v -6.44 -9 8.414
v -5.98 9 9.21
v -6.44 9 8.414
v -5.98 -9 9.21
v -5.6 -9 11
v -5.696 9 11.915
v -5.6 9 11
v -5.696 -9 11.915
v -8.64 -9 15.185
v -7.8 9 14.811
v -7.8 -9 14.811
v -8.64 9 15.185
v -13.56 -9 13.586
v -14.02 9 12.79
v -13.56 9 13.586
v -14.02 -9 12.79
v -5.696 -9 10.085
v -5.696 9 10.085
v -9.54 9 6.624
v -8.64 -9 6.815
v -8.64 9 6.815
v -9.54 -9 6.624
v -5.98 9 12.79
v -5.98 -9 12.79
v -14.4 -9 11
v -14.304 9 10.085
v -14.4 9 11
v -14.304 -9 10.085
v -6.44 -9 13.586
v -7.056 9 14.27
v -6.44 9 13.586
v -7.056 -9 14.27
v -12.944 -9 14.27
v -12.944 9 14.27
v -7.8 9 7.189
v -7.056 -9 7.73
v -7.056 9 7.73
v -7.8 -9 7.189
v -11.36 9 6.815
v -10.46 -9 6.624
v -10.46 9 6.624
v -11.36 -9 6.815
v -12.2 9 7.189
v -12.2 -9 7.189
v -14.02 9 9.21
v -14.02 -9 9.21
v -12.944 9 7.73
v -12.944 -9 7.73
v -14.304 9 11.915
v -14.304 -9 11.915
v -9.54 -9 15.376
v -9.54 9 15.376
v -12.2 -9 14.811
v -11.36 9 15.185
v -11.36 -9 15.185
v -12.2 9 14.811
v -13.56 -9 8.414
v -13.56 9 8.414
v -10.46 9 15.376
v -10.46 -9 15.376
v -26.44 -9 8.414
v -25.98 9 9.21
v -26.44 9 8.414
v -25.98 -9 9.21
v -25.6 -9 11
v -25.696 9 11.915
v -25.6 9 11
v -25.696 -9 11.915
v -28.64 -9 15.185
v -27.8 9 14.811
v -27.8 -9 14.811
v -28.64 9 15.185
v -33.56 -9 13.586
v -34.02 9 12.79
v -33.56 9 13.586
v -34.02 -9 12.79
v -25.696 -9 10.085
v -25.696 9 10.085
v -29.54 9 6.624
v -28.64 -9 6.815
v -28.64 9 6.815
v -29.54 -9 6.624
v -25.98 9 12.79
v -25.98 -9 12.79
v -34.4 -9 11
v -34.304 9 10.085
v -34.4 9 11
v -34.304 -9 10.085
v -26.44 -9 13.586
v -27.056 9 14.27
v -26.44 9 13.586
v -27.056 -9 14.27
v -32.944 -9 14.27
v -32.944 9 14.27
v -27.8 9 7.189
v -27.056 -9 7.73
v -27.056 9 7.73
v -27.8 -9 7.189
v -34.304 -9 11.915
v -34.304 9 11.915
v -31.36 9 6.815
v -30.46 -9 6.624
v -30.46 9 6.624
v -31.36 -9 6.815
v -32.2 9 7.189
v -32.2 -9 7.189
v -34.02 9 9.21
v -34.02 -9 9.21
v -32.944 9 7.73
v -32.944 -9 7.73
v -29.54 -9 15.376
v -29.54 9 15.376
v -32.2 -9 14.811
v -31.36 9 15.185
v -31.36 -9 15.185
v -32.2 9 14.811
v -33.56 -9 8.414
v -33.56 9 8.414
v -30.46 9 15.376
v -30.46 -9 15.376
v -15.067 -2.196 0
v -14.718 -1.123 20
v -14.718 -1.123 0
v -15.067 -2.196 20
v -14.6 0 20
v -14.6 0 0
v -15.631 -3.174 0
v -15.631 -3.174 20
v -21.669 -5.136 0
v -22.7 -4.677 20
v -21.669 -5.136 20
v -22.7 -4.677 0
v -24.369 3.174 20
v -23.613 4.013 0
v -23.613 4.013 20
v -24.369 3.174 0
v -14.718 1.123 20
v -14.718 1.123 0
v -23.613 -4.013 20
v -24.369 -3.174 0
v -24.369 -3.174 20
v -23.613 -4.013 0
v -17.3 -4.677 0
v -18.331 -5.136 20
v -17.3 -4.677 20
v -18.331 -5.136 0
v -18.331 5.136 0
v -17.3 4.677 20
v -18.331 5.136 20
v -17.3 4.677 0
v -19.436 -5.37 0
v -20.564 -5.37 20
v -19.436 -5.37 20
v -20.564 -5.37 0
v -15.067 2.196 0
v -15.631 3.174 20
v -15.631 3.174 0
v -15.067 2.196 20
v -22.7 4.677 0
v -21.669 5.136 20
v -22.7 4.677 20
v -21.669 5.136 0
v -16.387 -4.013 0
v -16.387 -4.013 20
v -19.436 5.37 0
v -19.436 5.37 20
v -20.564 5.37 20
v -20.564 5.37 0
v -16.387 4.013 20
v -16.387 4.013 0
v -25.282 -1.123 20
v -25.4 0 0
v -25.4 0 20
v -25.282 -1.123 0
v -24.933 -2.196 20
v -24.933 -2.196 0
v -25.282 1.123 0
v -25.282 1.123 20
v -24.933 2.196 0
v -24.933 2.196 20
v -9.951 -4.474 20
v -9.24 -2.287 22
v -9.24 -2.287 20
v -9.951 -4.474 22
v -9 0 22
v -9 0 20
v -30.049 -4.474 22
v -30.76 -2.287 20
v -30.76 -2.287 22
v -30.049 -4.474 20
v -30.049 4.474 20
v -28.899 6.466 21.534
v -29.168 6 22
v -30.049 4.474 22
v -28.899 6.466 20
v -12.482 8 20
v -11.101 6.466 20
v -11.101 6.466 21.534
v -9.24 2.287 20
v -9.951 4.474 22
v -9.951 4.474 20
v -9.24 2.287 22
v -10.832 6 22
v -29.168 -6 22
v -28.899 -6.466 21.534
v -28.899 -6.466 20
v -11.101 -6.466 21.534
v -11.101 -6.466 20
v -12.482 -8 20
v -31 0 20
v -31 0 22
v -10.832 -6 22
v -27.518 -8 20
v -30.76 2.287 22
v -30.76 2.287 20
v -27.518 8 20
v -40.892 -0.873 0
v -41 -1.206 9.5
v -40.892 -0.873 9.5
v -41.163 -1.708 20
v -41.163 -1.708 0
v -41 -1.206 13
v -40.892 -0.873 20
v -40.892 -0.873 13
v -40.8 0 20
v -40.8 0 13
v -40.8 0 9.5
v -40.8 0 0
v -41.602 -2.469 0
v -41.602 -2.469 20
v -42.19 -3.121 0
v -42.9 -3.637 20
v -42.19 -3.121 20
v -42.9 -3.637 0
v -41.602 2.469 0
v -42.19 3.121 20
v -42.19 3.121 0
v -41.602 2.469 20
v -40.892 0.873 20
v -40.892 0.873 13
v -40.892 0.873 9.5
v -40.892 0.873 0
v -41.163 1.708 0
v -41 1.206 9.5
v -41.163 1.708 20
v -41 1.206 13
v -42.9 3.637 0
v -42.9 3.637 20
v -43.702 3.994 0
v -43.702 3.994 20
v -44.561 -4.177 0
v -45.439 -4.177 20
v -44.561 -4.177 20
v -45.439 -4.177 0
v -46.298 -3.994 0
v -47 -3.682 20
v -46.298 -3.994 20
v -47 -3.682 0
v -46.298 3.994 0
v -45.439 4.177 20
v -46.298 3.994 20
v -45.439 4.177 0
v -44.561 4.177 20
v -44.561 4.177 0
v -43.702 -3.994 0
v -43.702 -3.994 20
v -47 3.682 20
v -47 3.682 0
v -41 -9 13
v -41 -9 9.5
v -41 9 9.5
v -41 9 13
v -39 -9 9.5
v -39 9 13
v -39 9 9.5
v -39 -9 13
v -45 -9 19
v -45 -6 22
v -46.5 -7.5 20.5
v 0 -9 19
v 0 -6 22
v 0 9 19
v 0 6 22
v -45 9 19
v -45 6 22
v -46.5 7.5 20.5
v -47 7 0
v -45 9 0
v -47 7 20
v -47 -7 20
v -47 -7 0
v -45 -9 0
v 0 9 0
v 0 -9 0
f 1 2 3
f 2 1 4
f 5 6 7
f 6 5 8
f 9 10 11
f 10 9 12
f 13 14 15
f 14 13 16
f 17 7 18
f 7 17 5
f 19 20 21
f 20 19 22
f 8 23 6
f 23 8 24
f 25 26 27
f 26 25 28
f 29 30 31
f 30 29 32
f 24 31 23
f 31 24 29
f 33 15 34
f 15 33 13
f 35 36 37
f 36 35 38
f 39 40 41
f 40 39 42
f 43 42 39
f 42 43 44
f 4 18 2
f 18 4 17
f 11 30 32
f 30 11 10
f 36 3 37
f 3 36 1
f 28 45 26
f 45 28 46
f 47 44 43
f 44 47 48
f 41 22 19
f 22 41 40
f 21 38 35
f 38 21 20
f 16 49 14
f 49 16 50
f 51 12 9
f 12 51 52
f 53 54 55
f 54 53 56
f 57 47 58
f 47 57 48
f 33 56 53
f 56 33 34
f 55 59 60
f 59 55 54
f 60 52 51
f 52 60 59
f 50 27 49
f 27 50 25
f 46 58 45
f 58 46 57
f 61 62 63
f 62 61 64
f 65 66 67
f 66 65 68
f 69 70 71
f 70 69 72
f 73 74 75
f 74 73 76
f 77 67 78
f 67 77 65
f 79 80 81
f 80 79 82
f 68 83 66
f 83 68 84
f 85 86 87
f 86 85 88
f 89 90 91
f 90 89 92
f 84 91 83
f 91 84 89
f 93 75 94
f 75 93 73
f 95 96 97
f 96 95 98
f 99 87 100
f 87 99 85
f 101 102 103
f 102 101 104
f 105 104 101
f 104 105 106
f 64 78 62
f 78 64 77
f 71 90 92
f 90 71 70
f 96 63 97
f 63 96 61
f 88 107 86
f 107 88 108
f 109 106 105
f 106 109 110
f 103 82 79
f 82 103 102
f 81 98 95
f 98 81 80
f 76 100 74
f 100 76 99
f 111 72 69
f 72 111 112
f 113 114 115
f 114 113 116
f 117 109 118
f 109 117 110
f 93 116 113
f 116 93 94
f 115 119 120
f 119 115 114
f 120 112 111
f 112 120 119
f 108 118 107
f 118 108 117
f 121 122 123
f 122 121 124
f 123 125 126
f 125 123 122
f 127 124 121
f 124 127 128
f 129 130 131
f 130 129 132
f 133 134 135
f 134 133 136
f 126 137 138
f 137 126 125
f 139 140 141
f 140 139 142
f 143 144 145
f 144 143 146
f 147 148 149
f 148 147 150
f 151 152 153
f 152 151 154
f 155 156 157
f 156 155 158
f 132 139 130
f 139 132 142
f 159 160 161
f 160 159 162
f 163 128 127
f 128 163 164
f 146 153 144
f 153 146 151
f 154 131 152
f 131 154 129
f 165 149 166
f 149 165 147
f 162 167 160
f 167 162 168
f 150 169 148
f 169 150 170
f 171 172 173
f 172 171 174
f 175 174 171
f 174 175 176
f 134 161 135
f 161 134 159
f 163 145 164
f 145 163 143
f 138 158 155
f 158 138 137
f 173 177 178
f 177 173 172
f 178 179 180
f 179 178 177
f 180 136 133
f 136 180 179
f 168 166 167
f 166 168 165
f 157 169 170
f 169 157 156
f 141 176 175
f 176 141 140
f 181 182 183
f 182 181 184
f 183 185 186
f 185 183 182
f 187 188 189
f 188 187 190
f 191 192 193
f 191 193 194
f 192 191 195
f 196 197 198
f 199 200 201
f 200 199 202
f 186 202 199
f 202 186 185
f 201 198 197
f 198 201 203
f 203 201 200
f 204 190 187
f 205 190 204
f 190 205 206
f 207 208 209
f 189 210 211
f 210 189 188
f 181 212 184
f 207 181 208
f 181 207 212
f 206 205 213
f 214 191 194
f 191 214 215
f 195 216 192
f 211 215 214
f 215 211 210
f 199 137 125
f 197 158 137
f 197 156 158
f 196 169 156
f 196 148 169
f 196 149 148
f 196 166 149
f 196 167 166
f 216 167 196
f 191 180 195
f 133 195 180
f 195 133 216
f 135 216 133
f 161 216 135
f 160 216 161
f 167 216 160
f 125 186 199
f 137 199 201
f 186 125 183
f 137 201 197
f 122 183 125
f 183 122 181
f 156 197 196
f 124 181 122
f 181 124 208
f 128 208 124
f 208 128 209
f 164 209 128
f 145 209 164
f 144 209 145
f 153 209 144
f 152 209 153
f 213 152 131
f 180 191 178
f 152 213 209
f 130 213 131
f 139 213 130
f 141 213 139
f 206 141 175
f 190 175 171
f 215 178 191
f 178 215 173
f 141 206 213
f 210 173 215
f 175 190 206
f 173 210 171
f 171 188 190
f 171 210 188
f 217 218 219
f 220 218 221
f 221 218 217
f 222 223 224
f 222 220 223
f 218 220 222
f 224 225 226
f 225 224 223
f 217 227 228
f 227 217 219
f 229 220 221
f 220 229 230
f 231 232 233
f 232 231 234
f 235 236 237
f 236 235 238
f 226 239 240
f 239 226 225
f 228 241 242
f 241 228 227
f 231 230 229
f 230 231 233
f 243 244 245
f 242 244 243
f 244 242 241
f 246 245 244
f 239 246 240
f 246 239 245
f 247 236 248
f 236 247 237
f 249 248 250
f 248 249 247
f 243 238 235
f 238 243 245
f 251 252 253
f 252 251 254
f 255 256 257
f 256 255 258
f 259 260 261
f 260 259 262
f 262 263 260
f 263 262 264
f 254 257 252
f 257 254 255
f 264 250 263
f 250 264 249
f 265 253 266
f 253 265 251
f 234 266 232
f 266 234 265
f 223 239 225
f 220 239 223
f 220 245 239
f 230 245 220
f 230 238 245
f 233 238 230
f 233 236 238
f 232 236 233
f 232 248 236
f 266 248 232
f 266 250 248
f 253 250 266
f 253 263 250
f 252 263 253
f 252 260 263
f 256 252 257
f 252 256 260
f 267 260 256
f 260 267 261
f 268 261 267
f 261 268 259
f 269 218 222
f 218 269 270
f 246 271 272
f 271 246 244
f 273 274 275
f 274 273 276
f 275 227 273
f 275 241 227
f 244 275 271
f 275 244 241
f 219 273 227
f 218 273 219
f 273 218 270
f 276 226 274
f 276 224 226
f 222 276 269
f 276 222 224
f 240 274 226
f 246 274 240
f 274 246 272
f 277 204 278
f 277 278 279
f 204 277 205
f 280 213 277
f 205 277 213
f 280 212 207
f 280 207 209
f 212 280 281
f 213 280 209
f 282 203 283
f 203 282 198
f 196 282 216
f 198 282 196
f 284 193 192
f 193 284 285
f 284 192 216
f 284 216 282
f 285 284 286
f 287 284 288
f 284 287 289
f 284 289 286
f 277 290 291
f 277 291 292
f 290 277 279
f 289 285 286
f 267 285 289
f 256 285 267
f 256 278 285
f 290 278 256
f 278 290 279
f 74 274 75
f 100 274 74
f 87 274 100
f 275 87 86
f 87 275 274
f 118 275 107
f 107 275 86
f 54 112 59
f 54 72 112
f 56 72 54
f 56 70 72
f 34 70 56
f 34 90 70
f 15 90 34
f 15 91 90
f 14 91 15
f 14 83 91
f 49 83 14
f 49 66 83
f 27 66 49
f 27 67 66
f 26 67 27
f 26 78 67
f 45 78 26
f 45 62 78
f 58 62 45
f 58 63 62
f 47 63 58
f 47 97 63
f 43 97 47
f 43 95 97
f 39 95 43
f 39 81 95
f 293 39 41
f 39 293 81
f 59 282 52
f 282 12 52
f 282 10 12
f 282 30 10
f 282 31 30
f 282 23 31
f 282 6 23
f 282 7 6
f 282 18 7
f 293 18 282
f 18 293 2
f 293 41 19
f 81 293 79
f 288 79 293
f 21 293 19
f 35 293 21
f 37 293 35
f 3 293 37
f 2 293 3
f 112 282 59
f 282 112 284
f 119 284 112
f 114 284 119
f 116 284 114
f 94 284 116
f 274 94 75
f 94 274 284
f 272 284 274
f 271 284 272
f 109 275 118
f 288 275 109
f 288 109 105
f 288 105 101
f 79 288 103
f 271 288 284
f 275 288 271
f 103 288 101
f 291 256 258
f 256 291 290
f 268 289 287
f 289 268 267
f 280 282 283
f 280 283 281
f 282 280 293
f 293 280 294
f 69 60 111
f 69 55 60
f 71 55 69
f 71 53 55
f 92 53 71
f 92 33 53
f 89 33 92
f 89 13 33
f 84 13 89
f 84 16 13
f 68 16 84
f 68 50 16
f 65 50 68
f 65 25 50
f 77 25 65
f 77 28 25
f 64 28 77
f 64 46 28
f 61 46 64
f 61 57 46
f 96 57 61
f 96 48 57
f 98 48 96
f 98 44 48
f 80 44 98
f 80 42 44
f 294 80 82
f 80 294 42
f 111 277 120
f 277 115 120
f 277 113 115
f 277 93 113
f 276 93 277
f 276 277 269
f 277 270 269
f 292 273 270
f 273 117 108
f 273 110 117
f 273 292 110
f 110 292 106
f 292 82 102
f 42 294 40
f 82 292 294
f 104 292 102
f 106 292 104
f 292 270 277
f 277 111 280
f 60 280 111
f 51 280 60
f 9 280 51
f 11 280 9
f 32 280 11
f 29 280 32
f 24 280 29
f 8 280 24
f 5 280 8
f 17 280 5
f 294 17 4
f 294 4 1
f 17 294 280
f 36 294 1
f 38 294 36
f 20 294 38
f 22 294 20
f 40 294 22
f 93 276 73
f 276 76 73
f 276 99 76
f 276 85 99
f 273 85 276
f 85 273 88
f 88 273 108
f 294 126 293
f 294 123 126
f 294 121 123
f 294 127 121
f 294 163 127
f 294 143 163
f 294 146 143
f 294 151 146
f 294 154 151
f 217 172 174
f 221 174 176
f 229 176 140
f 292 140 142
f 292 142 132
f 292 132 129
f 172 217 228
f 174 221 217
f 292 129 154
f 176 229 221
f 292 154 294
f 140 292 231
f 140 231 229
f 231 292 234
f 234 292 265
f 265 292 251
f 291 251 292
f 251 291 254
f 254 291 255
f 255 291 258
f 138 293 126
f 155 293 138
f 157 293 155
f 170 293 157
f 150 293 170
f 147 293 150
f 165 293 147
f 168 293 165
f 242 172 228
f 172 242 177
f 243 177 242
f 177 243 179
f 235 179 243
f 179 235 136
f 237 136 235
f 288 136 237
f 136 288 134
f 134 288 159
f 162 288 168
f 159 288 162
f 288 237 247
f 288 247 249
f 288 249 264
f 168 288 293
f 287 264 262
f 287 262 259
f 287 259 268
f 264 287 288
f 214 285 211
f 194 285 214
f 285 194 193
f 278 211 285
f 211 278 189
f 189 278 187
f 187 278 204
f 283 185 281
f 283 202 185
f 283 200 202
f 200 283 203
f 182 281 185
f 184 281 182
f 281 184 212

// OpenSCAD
// PRUSA iteration3
// Y frame corners
// GNU GPL v3
// Josef Průša <iam@josefprusa.cz> and contributors
// http://www.reprap.org/wiki/Prusa_Mendel
// http://prusamendel.org


module corner_base(){	
 translate([-9,-11,0])cube([18,22,47]);
}

module corner_holes(){
 translate([-11,-11,0]){
  // Bottom hole
  translate([0,11,10]) rotate([0,90,0]) translate([0,0,-5]) cylinder(h = 270, r=4.4, $fn=30);
  // Top hole
  translate([0,11,30]) rotate([0,90,0]) translate([0,0,-5]) cylinder(h = 270, r=4.4, $fn=30);
  // Middle hole
  translate([11,0,20]) rotate([0,0,90]) rotate([0,90,0]) translate([0,0,-5]) cylinder(h = 270, r=5.4, $fn=30);

  // Washer hole
  translate([11,-3,20]) rotate([0,0,90]) rotate([0,90,0]) translate([0,0,-5]) cylinder(h = 10, r=11, $fn=30);

  // Top smooth rod insert
  // Smooth rod place
  translate([11,2,45]) rotate([0,90,90]) cylinder(h = 270, r=4.2, $fn=30); 
  // Ziptie
  translate([-5,9,39])  cube([30,3.5,2]);
 }
}

module corner_fancy(){
 // Side corner cutouts
  translate([-8,-9,0]) rotate([0,0,-45-180]) translate([-15,0,-1]) cube([30,30,51]);
  translate([8,-9,0]) rotate([0,0,45-180]) translate([-15,0,-1]) cube([30,30,51]);
 // Top corner cutouts
  translate([7,0,49-2]) rotate([0,45,0]) translate([-15,-15,0]) cube([30,30,30]);
  translate([-7,0,49-2]) rotate([0,-45,0]) translate([-15,-15,0]) cube([30,30,30]);
  rotate([0,0,90]){
   translate([-9,0,49-2]) rotate([0,-45,0]) translate([-15,-15,0]) cube([30,30,30]);
  }
}


// Final part
module corner(){
 // Rotate the part for better printing
 translate([0,0,11]) rotate([-90,0,0]) difference(){
  corner_base();
  corner_holes();
  corner_fancy();
 }
}

rotate([0,0,90]) corner();
